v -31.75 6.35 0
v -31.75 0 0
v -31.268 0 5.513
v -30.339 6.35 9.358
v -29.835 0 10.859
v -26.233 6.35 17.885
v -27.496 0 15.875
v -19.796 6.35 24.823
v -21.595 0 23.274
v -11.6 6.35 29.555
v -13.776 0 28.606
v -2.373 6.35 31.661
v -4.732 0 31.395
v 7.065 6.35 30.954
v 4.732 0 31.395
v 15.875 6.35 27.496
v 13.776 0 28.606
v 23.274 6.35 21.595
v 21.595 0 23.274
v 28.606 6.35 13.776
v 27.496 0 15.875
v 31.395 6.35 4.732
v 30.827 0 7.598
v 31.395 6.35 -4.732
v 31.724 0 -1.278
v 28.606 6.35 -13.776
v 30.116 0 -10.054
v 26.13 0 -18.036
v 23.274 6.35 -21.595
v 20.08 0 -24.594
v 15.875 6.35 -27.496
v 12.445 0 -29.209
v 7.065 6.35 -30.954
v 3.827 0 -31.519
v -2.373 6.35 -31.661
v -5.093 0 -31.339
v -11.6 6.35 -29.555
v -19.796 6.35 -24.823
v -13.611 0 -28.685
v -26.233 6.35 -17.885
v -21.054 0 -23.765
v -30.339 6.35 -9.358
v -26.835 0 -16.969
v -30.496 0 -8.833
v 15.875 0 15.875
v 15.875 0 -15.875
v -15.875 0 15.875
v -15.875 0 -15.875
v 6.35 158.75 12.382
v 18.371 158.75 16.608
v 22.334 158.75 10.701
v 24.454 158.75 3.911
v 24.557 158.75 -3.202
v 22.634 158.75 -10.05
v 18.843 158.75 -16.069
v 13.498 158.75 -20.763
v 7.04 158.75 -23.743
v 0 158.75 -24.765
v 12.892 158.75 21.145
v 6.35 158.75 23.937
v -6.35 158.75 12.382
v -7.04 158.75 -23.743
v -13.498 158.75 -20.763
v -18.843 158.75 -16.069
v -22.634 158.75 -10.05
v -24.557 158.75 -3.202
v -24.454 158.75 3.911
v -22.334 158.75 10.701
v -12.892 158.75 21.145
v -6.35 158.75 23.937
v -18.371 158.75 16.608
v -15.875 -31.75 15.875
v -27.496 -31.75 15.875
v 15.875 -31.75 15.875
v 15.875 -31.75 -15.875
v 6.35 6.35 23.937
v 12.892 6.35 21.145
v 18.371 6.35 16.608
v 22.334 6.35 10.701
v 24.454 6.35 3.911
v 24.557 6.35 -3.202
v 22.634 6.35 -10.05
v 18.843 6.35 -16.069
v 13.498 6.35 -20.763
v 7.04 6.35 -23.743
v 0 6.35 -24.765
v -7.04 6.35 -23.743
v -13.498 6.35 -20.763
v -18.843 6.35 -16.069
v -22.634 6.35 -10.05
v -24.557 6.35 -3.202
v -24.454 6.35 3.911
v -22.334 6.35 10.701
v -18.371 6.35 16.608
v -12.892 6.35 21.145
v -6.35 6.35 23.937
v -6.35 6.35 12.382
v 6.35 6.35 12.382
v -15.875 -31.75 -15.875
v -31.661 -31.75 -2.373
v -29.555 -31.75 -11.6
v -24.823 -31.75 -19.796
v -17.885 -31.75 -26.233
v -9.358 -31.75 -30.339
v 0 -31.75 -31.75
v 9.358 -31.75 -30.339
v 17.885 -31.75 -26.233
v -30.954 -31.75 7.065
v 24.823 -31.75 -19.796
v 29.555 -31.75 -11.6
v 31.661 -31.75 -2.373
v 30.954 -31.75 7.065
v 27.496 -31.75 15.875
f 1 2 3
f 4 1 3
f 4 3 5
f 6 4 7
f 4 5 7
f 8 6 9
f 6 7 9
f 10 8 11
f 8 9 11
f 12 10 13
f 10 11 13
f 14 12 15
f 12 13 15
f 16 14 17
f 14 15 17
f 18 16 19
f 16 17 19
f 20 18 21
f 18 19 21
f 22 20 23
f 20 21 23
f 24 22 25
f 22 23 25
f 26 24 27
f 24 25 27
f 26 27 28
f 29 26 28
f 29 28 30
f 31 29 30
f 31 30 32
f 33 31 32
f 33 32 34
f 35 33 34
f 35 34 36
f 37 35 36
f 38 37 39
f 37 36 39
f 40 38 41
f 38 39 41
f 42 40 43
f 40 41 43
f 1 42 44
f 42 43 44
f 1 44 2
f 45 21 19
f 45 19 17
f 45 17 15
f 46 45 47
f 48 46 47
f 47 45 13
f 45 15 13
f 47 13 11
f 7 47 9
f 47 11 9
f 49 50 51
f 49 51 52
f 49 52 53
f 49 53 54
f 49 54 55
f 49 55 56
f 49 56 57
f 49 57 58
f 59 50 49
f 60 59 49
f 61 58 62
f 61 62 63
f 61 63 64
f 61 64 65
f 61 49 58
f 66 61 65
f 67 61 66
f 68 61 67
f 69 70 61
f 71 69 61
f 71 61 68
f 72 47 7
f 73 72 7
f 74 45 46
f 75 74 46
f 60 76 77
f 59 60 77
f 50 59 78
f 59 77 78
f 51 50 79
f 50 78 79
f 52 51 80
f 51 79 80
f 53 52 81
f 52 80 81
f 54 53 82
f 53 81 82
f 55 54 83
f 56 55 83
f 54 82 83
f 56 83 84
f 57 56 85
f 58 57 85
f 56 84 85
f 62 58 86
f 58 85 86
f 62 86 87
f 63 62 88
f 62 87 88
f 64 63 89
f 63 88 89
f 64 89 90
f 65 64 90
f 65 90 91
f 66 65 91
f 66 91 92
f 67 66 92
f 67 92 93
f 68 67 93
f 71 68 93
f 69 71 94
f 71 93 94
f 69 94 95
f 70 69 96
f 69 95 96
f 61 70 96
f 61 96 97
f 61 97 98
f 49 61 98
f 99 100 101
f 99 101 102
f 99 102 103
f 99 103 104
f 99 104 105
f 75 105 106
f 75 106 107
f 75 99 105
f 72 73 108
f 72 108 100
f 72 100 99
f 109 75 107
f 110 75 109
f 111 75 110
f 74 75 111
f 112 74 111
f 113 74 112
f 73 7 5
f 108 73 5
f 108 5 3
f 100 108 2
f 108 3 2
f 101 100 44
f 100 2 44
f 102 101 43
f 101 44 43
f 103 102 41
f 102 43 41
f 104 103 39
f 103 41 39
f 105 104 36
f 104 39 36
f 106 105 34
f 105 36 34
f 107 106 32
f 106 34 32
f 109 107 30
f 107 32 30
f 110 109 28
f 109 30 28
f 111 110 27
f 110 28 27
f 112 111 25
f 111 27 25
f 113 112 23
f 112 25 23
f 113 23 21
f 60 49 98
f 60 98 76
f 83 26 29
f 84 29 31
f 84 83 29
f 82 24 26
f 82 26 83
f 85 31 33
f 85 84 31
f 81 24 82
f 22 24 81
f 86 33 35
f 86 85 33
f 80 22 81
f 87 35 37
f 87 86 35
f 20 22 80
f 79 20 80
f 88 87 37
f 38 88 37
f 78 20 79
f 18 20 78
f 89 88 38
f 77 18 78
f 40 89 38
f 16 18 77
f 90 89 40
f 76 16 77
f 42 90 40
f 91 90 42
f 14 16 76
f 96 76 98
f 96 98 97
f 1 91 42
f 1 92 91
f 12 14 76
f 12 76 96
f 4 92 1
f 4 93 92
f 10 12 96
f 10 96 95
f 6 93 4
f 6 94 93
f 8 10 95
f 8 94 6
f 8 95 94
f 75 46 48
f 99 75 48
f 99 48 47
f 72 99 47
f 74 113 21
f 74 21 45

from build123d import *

# Parameters (mm, degrees)
F1_DEPTH = 31.75
F2_R     = 31.75
F3_DEPTH = 6.35
F5_DEPTH = 152.4


with BuildPart() as f1:
    # F0 (on Front) → F1 (new body)
    with BuildSketch(Plane.XZ):
        with BuildLine():
            Line((-15.875, 15.875), (-27.496307, 15.875))
            ThreePointArc((-27.496307, 15.875), (0, -31.75), (27.496307, 15.875))
            Line((27.496307, 15.875), (15.875, 15.875))
            Line((15.875, 15.875), (15.875, -15.875))
            Line((15.875, -15.875), (-15.875, -15.875))
            Line((-15.875, -15.875), (-15.875, 15.875))
        make_face()
    extrude(amount=F1_DEPTH)

    # F2 (on face) → F3 (join)
    with BuildSketch(Plane(origin=(0, 0, 0), x_dir=(-1, 0, 0), z_dir=(0, 1, 0))):
        Circle(F2_R)
    extrude(amount=F3_DEPTH)

    # F4 (on face) → F5 (join)
    with BuildSketch(Plane(origin=(0, 6.35, 0), x_dir=(-1, 0, 0), z_dir=(0, 1, 0))):
        with BuildLine():
            Line((-6.35, 12.3825), (-6.35, 23.937058))
            ThreePointArc((-6.35, 23.937058), (0, -24.765), (6.35, 23.937058))
            Line((6.35, 23.937058), (6.35, 12.3825))
            Line((6.35, 12.3825), (0, 12.3825))
            Line((0, 12.3825), (-6.35, 12.3825))
        make_face()
    extrude(amount=F5_DEPTH)


solid = f1.part
